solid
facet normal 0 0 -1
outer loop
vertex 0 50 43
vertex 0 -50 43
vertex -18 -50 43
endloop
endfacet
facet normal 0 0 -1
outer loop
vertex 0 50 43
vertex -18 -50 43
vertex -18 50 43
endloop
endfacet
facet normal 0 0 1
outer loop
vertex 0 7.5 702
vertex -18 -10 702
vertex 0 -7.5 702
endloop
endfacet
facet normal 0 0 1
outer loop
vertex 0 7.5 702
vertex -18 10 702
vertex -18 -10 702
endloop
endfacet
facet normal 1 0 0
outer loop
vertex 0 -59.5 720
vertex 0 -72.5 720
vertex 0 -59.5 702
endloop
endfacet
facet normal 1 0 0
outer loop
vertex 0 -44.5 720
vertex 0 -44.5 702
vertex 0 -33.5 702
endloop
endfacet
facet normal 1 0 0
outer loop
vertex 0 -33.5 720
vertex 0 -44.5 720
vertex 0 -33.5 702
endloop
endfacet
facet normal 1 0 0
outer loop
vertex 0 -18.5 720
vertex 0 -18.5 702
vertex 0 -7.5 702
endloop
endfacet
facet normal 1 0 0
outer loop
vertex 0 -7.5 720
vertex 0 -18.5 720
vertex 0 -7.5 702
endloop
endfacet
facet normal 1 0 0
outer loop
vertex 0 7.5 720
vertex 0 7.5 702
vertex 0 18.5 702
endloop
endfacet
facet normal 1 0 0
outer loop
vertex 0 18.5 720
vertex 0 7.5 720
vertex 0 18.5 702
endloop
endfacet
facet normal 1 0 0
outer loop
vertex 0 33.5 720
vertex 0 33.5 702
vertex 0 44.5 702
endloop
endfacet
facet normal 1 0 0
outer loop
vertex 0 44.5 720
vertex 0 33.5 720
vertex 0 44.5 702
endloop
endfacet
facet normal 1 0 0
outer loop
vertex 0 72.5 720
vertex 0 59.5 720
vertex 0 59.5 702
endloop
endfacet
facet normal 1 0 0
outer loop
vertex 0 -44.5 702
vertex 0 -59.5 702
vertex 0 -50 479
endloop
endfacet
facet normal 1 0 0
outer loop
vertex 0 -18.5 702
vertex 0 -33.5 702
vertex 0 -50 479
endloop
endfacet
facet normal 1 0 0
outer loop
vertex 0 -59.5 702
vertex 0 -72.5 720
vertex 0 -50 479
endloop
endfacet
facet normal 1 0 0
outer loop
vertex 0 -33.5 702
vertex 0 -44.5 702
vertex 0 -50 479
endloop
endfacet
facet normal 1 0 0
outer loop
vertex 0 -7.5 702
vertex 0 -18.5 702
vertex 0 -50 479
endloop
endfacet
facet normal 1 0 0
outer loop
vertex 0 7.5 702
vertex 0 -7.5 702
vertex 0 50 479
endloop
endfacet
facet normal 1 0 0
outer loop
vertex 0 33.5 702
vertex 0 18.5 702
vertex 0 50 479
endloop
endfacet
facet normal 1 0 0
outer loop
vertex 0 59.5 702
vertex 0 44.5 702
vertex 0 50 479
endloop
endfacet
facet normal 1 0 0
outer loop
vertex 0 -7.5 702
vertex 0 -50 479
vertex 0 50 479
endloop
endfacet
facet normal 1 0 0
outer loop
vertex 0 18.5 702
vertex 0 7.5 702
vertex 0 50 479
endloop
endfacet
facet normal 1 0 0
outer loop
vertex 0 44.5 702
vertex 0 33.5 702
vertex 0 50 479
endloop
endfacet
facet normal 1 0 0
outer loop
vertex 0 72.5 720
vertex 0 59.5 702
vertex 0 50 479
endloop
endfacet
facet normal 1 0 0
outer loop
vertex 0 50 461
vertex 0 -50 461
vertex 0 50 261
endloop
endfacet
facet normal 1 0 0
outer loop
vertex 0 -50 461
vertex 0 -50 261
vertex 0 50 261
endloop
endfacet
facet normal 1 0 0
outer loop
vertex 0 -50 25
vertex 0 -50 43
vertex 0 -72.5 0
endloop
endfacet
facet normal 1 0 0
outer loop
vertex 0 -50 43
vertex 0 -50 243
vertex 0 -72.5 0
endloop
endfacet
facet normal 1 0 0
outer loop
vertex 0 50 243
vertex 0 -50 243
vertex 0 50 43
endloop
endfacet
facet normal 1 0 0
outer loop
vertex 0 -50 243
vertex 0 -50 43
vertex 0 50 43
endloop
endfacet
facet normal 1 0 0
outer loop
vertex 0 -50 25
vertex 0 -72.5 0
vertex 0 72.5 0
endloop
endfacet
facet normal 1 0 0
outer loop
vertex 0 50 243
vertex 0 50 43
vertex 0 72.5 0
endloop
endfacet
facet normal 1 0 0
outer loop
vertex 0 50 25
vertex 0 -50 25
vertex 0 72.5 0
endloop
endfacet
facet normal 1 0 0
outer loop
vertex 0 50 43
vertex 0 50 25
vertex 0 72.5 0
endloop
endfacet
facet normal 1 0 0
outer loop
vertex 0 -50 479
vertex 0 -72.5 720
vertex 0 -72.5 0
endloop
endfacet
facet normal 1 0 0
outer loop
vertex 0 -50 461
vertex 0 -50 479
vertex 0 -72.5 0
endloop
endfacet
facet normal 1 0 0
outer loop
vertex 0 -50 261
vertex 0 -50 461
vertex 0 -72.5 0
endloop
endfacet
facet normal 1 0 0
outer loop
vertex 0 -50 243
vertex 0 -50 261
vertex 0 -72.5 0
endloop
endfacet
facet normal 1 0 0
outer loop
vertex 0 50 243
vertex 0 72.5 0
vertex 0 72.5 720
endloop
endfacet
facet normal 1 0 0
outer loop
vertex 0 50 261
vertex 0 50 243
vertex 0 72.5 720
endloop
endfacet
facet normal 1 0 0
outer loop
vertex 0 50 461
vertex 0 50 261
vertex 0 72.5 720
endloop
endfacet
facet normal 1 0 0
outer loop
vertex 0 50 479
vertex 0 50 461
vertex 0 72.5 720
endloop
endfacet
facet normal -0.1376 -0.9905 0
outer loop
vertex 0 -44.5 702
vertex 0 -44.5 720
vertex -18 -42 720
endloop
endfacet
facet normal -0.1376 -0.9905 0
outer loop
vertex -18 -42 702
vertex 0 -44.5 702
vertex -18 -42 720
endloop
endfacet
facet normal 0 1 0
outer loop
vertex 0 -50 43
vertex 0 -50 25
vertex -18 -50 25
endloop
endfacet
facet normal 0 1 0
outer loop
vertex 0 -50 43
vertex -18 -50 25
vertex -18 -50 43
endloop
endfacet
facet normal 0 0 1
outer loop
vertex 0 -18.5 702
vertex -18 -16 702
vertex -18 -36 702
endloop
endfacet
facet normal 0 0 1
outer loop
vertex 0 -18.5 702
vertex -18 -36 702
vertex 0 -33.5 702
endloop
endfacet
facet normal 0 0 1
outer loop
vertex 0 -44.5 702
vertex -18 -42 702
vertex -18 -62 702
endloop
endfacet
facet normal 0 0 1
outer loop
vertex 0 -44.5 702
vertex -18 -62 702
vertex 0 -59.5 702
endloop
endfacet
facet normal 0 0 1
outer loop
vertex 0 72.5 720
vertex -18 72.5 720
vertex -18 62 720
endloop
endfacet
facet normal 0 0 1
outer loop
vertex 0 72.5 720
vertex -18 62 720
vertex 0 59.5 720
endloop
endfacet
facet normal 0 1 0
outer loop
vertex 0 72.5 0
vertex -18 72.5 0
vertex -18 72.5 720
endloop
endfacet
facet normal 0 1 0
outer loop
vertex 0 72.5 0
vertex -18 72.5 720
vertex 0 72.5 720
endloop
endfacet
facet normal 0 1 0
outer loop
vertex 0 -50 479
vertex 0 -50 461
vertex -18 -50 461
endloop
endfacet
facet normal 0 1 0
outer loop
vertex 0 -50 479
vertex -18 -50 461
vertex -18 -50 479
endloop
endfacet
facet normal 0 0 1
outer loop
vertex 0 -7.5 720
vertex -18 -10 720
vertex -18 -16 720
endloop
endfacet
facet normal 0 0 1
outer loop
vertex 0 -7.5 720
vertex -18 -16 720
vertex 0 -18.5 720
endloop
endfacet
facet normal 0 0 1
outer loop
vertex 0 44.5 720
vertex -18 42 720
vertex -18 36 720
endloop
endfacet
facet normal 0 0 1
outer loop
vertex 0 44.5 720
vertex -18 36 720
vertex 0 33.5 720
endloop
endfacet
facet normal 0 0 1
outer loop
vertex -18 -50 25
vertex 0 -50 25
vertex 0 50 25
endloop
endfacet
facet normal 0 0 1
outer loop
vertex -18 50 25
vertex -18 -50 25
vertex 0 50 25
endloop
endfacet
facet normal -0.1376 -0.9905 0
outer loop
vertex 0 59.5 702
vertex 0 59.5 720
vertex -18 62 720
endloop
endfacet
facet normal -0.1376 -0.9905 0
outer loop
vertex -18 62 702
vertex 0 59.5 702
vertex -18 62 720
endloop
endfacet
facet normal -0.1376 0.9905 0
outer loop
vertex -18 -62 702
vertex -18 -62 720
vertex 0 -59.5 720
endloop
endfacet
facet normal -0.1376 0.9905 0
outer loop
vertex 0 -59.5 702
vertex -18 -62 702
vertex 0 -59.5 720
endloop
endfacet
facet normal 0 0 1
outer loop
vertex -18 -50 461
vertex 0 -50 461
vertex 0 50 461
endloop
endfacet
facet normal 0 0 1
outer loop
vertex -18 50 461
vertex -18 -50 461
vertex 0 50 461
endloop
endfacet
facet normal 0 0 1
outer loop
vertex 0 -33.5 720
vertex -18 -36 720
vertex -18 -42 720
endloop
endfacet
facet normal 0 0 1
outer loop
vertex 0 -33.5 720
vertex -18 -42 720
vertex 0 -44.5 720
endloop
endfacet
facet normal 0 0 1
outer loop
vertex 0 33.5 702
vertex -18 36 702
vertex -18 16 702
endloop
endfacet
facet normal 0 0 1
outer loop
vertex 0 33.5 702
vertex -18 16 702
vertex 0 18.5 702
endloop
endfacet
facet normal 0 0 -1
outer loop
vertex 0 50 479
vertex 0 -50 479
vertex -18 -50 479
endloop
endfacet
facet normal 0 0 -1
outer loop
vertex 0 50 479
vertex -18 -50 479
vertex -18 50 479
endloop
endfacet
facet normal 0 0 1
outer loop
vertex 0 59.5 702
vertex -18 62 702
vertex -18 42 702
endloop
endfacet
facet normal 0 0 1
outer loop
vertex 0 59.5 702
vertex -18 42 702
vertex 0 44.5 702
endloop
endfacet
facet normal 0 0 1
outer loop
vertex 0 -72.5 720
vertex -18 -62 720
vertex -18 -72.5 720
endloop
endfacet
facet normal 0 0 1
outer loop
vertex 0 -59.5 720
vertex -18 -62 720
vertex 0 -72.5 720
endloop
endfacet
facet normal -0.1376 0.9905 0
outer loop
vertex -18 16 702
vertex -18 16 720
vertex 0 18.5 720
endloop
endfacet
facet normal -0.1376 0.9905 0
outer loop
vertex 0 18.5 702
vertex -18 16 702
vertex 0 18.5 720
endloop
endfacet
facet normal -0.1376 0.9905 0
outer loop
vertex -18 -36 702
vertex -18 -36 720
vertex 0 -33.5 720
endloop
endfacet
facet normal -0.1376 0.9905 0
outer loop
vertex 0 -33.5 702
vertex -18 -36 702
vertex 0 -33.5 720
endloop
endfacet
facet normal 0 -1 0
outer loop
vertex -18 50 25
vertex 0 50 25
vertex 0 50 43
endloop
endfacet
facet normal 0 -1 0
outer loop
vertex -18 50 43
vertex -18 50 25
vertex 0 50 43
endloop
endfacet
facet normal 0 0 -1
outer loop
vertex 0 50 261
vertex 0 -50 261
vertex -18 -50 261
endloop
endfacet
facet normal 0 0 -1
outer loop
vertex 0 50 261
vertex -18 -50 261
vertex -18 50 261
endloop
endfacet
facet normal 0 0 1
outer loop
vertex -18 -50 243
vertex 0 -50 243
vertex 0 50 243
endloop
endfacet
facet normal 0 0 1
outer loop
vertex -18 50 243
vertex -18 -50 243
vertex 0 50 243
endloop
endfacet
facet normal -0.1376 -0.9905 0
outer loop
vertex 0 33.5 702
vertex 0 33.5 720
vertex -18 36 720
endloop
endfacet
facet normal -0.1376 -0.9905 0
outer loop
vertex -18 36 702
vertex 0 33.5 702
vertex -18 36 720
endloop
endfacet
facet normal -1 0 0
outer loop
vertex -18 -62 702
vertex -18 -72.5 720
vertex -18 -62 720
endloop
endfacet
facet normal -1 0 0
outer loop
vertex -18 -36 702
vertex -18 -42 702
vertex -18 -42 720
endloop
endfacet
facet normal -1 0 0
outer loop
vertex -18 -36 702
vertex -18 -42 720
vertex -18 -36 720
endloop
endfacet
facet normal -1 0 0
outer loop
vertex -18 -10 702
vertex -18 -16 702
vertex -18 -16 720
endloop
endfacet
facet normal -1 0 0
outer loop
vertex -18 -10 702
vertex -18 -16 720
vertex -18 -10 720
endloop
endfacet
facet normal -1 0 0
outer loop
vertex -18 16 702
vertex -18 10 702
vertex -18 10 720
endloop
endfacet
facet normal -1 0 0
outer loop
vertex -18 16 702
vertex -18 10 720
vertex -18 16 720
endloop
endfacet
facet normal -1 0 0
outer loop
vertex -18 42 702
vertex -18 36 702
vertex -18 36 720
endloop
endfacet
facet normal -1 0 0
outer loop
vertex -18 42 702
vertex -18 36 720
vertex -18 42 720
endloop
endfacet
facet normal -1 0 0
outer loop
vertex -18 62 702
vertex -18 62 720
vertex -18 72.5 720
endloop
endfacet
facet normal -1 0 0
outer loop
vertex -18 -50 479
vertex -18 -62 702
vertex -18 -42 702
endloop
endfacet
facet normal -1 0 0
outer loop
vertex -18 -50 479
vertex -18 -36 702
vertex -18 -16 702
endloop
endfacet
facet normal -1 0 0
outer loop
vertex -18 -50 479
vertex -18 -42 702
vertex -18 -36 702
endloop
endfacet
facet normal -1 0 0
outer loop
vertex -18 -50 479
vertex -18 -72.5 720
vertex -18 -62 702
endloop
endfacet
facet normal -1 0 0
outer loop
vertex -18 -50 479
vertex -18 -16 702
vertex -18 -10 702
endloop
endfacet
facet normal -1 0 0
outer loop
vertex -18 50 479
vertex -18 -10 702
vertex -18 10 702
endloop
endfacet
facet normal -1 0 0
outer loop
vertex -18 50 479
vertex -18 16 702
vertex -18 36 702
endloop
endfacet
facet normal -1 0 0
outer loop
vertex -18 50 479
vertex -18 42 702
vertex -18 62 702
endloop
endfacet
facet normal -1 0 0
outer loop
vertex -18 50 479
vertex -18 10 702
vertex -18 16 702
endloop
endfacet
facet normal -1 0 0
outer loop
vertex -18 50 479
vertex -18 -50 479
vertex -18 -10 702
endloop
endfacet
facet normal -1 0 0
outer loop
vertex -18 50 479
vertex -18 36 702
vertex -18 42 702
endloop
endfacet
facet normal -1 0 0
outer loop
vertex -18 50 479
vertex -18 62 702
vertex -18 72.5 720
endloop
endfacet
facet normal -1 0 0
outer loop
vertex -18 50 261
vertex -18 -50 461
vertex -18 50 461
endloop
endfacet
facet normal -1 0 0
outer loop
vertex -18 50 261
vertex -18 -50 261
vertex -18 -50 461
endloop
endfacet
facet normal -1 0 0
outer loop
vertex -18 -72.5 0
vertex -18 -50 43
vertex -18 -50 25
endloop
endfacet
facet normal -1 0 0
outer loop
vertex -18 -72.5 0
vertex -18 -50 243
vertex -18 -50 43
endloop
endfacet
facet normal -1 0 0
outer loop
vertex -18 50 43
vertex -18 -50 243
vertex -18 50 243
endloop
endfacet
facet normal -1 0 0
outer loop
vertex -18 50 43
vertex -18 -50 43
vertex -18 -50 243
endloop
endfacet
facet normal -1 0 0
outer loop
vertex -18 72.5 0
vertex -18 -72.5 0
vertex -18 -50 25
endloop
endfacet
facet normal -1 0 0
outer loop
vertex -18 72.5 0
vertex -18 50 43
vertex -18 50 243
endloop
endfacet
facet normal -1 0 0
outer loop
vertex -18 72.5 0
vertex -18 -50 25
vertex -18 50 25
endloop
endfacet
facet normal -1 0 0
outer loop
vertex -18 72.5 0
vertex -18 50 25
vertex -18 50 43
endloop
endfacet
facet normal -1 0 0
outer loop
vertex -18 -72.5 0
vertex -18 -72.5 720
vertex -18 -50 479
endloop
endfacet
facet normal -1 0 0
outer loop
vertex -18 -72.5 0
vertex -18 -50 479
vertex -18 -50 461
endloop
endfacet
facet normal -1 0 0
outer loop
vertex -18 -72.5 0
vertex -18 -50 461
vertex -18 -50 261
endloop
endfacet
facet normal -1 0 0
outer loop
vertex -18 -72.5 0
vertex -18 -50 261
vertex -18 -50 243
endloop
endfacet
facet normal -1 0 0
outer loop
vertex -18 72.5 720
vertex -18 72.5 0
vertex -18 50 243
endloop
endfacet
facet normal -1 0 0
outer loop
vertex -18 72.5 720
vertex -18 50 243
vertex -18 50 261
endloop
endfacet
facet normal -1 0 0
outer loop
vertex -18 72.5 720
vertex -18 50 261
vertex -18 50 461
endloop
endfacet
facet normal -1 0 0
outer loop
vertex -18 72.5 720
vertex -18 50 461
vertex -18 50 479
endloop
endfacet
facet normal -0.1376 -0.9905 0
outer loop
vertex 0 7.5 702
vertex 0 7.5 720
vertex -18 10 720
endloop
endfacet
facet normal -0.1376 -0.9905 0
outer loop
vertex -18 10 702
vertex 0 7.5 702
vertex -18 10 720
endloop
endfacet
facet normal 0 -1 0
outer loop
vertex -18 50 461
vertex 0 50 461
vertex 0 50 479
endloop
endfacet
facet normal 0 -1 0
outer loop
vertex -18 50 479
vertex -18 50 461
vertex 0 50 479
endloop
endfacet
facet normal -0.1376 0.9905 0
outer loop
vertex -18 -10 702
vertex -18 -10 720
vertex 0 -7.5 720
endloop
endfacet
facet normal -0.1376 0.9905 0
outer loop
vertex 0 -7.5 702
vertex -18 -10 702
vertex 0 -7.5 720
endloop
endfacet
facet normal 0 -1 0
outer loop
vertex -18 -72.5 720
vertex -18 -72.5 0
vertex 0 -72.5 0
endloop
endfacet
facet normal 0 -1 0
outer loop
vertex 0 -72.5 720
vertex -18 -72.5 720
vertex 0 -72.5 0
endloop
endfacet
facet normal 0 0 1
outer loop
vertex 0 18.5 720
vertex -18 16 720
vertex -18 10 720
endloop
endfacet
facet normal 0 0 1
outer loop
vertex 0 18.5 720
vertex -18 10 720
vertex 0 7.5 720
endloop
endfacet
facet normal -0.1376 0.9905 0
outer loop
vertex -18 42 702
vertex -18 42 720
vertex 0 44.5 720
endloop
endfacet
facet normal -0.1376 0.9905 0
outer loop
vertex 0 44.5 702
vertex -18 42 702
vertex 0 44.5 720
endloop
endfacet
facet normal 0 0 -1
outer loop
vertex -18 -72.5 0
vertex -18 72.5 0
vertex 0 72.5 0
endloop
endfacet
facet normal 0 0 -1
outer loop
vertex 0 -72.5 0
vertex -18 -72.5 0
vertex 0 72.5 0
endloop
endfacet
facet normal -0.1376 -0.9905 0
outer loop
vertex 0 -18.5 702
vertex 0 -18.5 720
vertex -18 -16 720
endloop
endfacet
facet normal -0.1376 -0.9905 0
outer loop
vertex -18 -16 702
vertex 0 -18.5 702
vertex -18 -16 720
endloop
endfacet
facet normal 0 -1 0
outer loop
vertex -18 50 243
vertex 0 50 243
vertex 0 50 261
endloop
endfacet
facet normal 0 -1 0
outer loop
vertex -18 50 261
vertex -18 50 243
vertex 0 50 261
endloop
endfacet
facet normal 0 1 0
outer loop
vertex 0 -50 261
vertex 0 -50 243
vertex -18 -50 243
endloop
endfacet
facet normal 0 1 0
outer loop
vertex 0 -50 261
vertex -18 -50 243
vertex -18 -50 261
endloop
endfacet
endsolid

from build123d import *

# Parameters (mm, degrees)
F0_W     = 18
F0_H     = 145
F1_DEPTH = 720
F2_W     = 100
F2_H     = 18
F3_DEPTH = 18.001
F5_DEPTH = 18


with BuildPart() as f1:
    # F0 (on Top) → F1 (new body)
    with BuildSketch(Plane.XY):
        with Locations((-9, 0)):
            Rectangle(F0_W, F0_H)
    extrude(amount=F1_DEPTH)

    # F2 (on face) → F3 (cut, through all)
    with BuildSketch(Plane.YZ):
        with Locations((0, 34)):
            Rectangle(F2_W, F2_H)
        with Locations((0, 252)):
            Rectangle(F2_W, F2_H)
        with Locations((0, 470)):
            Rectangle(F2_W, F2_H)
    extrude(amount=-F3_DEPTH, mode=Mode.SUBTRACT)

    # F4 (on face) → F5 (cut)
    with BuildSketch(Plane.XY.offset(720)):
        Polygon((-18, 0), (-18, -10), (0, -7.5), (0, 0), (0, 7.5), (-18, 10), align=None)
        Polygon((0, -18.5), (-18, -16), (-18, -36), (0, -33.5), align=None)
        Polygon((-18, 36), (-18, 16), (0, 18.5), (0, 33.5), align=None)
        Polygon((-18, 62), (-18, 42), (0, 44.5), (0, 59.5), align=None)
        Polygon((0, -44.5), (-18, -42), (-18, -62), (0, -59.5), align=None)
    extrude(amount=-F5_DEPTH, mode=Mode.SUBTRACT)


solid = f1.part
